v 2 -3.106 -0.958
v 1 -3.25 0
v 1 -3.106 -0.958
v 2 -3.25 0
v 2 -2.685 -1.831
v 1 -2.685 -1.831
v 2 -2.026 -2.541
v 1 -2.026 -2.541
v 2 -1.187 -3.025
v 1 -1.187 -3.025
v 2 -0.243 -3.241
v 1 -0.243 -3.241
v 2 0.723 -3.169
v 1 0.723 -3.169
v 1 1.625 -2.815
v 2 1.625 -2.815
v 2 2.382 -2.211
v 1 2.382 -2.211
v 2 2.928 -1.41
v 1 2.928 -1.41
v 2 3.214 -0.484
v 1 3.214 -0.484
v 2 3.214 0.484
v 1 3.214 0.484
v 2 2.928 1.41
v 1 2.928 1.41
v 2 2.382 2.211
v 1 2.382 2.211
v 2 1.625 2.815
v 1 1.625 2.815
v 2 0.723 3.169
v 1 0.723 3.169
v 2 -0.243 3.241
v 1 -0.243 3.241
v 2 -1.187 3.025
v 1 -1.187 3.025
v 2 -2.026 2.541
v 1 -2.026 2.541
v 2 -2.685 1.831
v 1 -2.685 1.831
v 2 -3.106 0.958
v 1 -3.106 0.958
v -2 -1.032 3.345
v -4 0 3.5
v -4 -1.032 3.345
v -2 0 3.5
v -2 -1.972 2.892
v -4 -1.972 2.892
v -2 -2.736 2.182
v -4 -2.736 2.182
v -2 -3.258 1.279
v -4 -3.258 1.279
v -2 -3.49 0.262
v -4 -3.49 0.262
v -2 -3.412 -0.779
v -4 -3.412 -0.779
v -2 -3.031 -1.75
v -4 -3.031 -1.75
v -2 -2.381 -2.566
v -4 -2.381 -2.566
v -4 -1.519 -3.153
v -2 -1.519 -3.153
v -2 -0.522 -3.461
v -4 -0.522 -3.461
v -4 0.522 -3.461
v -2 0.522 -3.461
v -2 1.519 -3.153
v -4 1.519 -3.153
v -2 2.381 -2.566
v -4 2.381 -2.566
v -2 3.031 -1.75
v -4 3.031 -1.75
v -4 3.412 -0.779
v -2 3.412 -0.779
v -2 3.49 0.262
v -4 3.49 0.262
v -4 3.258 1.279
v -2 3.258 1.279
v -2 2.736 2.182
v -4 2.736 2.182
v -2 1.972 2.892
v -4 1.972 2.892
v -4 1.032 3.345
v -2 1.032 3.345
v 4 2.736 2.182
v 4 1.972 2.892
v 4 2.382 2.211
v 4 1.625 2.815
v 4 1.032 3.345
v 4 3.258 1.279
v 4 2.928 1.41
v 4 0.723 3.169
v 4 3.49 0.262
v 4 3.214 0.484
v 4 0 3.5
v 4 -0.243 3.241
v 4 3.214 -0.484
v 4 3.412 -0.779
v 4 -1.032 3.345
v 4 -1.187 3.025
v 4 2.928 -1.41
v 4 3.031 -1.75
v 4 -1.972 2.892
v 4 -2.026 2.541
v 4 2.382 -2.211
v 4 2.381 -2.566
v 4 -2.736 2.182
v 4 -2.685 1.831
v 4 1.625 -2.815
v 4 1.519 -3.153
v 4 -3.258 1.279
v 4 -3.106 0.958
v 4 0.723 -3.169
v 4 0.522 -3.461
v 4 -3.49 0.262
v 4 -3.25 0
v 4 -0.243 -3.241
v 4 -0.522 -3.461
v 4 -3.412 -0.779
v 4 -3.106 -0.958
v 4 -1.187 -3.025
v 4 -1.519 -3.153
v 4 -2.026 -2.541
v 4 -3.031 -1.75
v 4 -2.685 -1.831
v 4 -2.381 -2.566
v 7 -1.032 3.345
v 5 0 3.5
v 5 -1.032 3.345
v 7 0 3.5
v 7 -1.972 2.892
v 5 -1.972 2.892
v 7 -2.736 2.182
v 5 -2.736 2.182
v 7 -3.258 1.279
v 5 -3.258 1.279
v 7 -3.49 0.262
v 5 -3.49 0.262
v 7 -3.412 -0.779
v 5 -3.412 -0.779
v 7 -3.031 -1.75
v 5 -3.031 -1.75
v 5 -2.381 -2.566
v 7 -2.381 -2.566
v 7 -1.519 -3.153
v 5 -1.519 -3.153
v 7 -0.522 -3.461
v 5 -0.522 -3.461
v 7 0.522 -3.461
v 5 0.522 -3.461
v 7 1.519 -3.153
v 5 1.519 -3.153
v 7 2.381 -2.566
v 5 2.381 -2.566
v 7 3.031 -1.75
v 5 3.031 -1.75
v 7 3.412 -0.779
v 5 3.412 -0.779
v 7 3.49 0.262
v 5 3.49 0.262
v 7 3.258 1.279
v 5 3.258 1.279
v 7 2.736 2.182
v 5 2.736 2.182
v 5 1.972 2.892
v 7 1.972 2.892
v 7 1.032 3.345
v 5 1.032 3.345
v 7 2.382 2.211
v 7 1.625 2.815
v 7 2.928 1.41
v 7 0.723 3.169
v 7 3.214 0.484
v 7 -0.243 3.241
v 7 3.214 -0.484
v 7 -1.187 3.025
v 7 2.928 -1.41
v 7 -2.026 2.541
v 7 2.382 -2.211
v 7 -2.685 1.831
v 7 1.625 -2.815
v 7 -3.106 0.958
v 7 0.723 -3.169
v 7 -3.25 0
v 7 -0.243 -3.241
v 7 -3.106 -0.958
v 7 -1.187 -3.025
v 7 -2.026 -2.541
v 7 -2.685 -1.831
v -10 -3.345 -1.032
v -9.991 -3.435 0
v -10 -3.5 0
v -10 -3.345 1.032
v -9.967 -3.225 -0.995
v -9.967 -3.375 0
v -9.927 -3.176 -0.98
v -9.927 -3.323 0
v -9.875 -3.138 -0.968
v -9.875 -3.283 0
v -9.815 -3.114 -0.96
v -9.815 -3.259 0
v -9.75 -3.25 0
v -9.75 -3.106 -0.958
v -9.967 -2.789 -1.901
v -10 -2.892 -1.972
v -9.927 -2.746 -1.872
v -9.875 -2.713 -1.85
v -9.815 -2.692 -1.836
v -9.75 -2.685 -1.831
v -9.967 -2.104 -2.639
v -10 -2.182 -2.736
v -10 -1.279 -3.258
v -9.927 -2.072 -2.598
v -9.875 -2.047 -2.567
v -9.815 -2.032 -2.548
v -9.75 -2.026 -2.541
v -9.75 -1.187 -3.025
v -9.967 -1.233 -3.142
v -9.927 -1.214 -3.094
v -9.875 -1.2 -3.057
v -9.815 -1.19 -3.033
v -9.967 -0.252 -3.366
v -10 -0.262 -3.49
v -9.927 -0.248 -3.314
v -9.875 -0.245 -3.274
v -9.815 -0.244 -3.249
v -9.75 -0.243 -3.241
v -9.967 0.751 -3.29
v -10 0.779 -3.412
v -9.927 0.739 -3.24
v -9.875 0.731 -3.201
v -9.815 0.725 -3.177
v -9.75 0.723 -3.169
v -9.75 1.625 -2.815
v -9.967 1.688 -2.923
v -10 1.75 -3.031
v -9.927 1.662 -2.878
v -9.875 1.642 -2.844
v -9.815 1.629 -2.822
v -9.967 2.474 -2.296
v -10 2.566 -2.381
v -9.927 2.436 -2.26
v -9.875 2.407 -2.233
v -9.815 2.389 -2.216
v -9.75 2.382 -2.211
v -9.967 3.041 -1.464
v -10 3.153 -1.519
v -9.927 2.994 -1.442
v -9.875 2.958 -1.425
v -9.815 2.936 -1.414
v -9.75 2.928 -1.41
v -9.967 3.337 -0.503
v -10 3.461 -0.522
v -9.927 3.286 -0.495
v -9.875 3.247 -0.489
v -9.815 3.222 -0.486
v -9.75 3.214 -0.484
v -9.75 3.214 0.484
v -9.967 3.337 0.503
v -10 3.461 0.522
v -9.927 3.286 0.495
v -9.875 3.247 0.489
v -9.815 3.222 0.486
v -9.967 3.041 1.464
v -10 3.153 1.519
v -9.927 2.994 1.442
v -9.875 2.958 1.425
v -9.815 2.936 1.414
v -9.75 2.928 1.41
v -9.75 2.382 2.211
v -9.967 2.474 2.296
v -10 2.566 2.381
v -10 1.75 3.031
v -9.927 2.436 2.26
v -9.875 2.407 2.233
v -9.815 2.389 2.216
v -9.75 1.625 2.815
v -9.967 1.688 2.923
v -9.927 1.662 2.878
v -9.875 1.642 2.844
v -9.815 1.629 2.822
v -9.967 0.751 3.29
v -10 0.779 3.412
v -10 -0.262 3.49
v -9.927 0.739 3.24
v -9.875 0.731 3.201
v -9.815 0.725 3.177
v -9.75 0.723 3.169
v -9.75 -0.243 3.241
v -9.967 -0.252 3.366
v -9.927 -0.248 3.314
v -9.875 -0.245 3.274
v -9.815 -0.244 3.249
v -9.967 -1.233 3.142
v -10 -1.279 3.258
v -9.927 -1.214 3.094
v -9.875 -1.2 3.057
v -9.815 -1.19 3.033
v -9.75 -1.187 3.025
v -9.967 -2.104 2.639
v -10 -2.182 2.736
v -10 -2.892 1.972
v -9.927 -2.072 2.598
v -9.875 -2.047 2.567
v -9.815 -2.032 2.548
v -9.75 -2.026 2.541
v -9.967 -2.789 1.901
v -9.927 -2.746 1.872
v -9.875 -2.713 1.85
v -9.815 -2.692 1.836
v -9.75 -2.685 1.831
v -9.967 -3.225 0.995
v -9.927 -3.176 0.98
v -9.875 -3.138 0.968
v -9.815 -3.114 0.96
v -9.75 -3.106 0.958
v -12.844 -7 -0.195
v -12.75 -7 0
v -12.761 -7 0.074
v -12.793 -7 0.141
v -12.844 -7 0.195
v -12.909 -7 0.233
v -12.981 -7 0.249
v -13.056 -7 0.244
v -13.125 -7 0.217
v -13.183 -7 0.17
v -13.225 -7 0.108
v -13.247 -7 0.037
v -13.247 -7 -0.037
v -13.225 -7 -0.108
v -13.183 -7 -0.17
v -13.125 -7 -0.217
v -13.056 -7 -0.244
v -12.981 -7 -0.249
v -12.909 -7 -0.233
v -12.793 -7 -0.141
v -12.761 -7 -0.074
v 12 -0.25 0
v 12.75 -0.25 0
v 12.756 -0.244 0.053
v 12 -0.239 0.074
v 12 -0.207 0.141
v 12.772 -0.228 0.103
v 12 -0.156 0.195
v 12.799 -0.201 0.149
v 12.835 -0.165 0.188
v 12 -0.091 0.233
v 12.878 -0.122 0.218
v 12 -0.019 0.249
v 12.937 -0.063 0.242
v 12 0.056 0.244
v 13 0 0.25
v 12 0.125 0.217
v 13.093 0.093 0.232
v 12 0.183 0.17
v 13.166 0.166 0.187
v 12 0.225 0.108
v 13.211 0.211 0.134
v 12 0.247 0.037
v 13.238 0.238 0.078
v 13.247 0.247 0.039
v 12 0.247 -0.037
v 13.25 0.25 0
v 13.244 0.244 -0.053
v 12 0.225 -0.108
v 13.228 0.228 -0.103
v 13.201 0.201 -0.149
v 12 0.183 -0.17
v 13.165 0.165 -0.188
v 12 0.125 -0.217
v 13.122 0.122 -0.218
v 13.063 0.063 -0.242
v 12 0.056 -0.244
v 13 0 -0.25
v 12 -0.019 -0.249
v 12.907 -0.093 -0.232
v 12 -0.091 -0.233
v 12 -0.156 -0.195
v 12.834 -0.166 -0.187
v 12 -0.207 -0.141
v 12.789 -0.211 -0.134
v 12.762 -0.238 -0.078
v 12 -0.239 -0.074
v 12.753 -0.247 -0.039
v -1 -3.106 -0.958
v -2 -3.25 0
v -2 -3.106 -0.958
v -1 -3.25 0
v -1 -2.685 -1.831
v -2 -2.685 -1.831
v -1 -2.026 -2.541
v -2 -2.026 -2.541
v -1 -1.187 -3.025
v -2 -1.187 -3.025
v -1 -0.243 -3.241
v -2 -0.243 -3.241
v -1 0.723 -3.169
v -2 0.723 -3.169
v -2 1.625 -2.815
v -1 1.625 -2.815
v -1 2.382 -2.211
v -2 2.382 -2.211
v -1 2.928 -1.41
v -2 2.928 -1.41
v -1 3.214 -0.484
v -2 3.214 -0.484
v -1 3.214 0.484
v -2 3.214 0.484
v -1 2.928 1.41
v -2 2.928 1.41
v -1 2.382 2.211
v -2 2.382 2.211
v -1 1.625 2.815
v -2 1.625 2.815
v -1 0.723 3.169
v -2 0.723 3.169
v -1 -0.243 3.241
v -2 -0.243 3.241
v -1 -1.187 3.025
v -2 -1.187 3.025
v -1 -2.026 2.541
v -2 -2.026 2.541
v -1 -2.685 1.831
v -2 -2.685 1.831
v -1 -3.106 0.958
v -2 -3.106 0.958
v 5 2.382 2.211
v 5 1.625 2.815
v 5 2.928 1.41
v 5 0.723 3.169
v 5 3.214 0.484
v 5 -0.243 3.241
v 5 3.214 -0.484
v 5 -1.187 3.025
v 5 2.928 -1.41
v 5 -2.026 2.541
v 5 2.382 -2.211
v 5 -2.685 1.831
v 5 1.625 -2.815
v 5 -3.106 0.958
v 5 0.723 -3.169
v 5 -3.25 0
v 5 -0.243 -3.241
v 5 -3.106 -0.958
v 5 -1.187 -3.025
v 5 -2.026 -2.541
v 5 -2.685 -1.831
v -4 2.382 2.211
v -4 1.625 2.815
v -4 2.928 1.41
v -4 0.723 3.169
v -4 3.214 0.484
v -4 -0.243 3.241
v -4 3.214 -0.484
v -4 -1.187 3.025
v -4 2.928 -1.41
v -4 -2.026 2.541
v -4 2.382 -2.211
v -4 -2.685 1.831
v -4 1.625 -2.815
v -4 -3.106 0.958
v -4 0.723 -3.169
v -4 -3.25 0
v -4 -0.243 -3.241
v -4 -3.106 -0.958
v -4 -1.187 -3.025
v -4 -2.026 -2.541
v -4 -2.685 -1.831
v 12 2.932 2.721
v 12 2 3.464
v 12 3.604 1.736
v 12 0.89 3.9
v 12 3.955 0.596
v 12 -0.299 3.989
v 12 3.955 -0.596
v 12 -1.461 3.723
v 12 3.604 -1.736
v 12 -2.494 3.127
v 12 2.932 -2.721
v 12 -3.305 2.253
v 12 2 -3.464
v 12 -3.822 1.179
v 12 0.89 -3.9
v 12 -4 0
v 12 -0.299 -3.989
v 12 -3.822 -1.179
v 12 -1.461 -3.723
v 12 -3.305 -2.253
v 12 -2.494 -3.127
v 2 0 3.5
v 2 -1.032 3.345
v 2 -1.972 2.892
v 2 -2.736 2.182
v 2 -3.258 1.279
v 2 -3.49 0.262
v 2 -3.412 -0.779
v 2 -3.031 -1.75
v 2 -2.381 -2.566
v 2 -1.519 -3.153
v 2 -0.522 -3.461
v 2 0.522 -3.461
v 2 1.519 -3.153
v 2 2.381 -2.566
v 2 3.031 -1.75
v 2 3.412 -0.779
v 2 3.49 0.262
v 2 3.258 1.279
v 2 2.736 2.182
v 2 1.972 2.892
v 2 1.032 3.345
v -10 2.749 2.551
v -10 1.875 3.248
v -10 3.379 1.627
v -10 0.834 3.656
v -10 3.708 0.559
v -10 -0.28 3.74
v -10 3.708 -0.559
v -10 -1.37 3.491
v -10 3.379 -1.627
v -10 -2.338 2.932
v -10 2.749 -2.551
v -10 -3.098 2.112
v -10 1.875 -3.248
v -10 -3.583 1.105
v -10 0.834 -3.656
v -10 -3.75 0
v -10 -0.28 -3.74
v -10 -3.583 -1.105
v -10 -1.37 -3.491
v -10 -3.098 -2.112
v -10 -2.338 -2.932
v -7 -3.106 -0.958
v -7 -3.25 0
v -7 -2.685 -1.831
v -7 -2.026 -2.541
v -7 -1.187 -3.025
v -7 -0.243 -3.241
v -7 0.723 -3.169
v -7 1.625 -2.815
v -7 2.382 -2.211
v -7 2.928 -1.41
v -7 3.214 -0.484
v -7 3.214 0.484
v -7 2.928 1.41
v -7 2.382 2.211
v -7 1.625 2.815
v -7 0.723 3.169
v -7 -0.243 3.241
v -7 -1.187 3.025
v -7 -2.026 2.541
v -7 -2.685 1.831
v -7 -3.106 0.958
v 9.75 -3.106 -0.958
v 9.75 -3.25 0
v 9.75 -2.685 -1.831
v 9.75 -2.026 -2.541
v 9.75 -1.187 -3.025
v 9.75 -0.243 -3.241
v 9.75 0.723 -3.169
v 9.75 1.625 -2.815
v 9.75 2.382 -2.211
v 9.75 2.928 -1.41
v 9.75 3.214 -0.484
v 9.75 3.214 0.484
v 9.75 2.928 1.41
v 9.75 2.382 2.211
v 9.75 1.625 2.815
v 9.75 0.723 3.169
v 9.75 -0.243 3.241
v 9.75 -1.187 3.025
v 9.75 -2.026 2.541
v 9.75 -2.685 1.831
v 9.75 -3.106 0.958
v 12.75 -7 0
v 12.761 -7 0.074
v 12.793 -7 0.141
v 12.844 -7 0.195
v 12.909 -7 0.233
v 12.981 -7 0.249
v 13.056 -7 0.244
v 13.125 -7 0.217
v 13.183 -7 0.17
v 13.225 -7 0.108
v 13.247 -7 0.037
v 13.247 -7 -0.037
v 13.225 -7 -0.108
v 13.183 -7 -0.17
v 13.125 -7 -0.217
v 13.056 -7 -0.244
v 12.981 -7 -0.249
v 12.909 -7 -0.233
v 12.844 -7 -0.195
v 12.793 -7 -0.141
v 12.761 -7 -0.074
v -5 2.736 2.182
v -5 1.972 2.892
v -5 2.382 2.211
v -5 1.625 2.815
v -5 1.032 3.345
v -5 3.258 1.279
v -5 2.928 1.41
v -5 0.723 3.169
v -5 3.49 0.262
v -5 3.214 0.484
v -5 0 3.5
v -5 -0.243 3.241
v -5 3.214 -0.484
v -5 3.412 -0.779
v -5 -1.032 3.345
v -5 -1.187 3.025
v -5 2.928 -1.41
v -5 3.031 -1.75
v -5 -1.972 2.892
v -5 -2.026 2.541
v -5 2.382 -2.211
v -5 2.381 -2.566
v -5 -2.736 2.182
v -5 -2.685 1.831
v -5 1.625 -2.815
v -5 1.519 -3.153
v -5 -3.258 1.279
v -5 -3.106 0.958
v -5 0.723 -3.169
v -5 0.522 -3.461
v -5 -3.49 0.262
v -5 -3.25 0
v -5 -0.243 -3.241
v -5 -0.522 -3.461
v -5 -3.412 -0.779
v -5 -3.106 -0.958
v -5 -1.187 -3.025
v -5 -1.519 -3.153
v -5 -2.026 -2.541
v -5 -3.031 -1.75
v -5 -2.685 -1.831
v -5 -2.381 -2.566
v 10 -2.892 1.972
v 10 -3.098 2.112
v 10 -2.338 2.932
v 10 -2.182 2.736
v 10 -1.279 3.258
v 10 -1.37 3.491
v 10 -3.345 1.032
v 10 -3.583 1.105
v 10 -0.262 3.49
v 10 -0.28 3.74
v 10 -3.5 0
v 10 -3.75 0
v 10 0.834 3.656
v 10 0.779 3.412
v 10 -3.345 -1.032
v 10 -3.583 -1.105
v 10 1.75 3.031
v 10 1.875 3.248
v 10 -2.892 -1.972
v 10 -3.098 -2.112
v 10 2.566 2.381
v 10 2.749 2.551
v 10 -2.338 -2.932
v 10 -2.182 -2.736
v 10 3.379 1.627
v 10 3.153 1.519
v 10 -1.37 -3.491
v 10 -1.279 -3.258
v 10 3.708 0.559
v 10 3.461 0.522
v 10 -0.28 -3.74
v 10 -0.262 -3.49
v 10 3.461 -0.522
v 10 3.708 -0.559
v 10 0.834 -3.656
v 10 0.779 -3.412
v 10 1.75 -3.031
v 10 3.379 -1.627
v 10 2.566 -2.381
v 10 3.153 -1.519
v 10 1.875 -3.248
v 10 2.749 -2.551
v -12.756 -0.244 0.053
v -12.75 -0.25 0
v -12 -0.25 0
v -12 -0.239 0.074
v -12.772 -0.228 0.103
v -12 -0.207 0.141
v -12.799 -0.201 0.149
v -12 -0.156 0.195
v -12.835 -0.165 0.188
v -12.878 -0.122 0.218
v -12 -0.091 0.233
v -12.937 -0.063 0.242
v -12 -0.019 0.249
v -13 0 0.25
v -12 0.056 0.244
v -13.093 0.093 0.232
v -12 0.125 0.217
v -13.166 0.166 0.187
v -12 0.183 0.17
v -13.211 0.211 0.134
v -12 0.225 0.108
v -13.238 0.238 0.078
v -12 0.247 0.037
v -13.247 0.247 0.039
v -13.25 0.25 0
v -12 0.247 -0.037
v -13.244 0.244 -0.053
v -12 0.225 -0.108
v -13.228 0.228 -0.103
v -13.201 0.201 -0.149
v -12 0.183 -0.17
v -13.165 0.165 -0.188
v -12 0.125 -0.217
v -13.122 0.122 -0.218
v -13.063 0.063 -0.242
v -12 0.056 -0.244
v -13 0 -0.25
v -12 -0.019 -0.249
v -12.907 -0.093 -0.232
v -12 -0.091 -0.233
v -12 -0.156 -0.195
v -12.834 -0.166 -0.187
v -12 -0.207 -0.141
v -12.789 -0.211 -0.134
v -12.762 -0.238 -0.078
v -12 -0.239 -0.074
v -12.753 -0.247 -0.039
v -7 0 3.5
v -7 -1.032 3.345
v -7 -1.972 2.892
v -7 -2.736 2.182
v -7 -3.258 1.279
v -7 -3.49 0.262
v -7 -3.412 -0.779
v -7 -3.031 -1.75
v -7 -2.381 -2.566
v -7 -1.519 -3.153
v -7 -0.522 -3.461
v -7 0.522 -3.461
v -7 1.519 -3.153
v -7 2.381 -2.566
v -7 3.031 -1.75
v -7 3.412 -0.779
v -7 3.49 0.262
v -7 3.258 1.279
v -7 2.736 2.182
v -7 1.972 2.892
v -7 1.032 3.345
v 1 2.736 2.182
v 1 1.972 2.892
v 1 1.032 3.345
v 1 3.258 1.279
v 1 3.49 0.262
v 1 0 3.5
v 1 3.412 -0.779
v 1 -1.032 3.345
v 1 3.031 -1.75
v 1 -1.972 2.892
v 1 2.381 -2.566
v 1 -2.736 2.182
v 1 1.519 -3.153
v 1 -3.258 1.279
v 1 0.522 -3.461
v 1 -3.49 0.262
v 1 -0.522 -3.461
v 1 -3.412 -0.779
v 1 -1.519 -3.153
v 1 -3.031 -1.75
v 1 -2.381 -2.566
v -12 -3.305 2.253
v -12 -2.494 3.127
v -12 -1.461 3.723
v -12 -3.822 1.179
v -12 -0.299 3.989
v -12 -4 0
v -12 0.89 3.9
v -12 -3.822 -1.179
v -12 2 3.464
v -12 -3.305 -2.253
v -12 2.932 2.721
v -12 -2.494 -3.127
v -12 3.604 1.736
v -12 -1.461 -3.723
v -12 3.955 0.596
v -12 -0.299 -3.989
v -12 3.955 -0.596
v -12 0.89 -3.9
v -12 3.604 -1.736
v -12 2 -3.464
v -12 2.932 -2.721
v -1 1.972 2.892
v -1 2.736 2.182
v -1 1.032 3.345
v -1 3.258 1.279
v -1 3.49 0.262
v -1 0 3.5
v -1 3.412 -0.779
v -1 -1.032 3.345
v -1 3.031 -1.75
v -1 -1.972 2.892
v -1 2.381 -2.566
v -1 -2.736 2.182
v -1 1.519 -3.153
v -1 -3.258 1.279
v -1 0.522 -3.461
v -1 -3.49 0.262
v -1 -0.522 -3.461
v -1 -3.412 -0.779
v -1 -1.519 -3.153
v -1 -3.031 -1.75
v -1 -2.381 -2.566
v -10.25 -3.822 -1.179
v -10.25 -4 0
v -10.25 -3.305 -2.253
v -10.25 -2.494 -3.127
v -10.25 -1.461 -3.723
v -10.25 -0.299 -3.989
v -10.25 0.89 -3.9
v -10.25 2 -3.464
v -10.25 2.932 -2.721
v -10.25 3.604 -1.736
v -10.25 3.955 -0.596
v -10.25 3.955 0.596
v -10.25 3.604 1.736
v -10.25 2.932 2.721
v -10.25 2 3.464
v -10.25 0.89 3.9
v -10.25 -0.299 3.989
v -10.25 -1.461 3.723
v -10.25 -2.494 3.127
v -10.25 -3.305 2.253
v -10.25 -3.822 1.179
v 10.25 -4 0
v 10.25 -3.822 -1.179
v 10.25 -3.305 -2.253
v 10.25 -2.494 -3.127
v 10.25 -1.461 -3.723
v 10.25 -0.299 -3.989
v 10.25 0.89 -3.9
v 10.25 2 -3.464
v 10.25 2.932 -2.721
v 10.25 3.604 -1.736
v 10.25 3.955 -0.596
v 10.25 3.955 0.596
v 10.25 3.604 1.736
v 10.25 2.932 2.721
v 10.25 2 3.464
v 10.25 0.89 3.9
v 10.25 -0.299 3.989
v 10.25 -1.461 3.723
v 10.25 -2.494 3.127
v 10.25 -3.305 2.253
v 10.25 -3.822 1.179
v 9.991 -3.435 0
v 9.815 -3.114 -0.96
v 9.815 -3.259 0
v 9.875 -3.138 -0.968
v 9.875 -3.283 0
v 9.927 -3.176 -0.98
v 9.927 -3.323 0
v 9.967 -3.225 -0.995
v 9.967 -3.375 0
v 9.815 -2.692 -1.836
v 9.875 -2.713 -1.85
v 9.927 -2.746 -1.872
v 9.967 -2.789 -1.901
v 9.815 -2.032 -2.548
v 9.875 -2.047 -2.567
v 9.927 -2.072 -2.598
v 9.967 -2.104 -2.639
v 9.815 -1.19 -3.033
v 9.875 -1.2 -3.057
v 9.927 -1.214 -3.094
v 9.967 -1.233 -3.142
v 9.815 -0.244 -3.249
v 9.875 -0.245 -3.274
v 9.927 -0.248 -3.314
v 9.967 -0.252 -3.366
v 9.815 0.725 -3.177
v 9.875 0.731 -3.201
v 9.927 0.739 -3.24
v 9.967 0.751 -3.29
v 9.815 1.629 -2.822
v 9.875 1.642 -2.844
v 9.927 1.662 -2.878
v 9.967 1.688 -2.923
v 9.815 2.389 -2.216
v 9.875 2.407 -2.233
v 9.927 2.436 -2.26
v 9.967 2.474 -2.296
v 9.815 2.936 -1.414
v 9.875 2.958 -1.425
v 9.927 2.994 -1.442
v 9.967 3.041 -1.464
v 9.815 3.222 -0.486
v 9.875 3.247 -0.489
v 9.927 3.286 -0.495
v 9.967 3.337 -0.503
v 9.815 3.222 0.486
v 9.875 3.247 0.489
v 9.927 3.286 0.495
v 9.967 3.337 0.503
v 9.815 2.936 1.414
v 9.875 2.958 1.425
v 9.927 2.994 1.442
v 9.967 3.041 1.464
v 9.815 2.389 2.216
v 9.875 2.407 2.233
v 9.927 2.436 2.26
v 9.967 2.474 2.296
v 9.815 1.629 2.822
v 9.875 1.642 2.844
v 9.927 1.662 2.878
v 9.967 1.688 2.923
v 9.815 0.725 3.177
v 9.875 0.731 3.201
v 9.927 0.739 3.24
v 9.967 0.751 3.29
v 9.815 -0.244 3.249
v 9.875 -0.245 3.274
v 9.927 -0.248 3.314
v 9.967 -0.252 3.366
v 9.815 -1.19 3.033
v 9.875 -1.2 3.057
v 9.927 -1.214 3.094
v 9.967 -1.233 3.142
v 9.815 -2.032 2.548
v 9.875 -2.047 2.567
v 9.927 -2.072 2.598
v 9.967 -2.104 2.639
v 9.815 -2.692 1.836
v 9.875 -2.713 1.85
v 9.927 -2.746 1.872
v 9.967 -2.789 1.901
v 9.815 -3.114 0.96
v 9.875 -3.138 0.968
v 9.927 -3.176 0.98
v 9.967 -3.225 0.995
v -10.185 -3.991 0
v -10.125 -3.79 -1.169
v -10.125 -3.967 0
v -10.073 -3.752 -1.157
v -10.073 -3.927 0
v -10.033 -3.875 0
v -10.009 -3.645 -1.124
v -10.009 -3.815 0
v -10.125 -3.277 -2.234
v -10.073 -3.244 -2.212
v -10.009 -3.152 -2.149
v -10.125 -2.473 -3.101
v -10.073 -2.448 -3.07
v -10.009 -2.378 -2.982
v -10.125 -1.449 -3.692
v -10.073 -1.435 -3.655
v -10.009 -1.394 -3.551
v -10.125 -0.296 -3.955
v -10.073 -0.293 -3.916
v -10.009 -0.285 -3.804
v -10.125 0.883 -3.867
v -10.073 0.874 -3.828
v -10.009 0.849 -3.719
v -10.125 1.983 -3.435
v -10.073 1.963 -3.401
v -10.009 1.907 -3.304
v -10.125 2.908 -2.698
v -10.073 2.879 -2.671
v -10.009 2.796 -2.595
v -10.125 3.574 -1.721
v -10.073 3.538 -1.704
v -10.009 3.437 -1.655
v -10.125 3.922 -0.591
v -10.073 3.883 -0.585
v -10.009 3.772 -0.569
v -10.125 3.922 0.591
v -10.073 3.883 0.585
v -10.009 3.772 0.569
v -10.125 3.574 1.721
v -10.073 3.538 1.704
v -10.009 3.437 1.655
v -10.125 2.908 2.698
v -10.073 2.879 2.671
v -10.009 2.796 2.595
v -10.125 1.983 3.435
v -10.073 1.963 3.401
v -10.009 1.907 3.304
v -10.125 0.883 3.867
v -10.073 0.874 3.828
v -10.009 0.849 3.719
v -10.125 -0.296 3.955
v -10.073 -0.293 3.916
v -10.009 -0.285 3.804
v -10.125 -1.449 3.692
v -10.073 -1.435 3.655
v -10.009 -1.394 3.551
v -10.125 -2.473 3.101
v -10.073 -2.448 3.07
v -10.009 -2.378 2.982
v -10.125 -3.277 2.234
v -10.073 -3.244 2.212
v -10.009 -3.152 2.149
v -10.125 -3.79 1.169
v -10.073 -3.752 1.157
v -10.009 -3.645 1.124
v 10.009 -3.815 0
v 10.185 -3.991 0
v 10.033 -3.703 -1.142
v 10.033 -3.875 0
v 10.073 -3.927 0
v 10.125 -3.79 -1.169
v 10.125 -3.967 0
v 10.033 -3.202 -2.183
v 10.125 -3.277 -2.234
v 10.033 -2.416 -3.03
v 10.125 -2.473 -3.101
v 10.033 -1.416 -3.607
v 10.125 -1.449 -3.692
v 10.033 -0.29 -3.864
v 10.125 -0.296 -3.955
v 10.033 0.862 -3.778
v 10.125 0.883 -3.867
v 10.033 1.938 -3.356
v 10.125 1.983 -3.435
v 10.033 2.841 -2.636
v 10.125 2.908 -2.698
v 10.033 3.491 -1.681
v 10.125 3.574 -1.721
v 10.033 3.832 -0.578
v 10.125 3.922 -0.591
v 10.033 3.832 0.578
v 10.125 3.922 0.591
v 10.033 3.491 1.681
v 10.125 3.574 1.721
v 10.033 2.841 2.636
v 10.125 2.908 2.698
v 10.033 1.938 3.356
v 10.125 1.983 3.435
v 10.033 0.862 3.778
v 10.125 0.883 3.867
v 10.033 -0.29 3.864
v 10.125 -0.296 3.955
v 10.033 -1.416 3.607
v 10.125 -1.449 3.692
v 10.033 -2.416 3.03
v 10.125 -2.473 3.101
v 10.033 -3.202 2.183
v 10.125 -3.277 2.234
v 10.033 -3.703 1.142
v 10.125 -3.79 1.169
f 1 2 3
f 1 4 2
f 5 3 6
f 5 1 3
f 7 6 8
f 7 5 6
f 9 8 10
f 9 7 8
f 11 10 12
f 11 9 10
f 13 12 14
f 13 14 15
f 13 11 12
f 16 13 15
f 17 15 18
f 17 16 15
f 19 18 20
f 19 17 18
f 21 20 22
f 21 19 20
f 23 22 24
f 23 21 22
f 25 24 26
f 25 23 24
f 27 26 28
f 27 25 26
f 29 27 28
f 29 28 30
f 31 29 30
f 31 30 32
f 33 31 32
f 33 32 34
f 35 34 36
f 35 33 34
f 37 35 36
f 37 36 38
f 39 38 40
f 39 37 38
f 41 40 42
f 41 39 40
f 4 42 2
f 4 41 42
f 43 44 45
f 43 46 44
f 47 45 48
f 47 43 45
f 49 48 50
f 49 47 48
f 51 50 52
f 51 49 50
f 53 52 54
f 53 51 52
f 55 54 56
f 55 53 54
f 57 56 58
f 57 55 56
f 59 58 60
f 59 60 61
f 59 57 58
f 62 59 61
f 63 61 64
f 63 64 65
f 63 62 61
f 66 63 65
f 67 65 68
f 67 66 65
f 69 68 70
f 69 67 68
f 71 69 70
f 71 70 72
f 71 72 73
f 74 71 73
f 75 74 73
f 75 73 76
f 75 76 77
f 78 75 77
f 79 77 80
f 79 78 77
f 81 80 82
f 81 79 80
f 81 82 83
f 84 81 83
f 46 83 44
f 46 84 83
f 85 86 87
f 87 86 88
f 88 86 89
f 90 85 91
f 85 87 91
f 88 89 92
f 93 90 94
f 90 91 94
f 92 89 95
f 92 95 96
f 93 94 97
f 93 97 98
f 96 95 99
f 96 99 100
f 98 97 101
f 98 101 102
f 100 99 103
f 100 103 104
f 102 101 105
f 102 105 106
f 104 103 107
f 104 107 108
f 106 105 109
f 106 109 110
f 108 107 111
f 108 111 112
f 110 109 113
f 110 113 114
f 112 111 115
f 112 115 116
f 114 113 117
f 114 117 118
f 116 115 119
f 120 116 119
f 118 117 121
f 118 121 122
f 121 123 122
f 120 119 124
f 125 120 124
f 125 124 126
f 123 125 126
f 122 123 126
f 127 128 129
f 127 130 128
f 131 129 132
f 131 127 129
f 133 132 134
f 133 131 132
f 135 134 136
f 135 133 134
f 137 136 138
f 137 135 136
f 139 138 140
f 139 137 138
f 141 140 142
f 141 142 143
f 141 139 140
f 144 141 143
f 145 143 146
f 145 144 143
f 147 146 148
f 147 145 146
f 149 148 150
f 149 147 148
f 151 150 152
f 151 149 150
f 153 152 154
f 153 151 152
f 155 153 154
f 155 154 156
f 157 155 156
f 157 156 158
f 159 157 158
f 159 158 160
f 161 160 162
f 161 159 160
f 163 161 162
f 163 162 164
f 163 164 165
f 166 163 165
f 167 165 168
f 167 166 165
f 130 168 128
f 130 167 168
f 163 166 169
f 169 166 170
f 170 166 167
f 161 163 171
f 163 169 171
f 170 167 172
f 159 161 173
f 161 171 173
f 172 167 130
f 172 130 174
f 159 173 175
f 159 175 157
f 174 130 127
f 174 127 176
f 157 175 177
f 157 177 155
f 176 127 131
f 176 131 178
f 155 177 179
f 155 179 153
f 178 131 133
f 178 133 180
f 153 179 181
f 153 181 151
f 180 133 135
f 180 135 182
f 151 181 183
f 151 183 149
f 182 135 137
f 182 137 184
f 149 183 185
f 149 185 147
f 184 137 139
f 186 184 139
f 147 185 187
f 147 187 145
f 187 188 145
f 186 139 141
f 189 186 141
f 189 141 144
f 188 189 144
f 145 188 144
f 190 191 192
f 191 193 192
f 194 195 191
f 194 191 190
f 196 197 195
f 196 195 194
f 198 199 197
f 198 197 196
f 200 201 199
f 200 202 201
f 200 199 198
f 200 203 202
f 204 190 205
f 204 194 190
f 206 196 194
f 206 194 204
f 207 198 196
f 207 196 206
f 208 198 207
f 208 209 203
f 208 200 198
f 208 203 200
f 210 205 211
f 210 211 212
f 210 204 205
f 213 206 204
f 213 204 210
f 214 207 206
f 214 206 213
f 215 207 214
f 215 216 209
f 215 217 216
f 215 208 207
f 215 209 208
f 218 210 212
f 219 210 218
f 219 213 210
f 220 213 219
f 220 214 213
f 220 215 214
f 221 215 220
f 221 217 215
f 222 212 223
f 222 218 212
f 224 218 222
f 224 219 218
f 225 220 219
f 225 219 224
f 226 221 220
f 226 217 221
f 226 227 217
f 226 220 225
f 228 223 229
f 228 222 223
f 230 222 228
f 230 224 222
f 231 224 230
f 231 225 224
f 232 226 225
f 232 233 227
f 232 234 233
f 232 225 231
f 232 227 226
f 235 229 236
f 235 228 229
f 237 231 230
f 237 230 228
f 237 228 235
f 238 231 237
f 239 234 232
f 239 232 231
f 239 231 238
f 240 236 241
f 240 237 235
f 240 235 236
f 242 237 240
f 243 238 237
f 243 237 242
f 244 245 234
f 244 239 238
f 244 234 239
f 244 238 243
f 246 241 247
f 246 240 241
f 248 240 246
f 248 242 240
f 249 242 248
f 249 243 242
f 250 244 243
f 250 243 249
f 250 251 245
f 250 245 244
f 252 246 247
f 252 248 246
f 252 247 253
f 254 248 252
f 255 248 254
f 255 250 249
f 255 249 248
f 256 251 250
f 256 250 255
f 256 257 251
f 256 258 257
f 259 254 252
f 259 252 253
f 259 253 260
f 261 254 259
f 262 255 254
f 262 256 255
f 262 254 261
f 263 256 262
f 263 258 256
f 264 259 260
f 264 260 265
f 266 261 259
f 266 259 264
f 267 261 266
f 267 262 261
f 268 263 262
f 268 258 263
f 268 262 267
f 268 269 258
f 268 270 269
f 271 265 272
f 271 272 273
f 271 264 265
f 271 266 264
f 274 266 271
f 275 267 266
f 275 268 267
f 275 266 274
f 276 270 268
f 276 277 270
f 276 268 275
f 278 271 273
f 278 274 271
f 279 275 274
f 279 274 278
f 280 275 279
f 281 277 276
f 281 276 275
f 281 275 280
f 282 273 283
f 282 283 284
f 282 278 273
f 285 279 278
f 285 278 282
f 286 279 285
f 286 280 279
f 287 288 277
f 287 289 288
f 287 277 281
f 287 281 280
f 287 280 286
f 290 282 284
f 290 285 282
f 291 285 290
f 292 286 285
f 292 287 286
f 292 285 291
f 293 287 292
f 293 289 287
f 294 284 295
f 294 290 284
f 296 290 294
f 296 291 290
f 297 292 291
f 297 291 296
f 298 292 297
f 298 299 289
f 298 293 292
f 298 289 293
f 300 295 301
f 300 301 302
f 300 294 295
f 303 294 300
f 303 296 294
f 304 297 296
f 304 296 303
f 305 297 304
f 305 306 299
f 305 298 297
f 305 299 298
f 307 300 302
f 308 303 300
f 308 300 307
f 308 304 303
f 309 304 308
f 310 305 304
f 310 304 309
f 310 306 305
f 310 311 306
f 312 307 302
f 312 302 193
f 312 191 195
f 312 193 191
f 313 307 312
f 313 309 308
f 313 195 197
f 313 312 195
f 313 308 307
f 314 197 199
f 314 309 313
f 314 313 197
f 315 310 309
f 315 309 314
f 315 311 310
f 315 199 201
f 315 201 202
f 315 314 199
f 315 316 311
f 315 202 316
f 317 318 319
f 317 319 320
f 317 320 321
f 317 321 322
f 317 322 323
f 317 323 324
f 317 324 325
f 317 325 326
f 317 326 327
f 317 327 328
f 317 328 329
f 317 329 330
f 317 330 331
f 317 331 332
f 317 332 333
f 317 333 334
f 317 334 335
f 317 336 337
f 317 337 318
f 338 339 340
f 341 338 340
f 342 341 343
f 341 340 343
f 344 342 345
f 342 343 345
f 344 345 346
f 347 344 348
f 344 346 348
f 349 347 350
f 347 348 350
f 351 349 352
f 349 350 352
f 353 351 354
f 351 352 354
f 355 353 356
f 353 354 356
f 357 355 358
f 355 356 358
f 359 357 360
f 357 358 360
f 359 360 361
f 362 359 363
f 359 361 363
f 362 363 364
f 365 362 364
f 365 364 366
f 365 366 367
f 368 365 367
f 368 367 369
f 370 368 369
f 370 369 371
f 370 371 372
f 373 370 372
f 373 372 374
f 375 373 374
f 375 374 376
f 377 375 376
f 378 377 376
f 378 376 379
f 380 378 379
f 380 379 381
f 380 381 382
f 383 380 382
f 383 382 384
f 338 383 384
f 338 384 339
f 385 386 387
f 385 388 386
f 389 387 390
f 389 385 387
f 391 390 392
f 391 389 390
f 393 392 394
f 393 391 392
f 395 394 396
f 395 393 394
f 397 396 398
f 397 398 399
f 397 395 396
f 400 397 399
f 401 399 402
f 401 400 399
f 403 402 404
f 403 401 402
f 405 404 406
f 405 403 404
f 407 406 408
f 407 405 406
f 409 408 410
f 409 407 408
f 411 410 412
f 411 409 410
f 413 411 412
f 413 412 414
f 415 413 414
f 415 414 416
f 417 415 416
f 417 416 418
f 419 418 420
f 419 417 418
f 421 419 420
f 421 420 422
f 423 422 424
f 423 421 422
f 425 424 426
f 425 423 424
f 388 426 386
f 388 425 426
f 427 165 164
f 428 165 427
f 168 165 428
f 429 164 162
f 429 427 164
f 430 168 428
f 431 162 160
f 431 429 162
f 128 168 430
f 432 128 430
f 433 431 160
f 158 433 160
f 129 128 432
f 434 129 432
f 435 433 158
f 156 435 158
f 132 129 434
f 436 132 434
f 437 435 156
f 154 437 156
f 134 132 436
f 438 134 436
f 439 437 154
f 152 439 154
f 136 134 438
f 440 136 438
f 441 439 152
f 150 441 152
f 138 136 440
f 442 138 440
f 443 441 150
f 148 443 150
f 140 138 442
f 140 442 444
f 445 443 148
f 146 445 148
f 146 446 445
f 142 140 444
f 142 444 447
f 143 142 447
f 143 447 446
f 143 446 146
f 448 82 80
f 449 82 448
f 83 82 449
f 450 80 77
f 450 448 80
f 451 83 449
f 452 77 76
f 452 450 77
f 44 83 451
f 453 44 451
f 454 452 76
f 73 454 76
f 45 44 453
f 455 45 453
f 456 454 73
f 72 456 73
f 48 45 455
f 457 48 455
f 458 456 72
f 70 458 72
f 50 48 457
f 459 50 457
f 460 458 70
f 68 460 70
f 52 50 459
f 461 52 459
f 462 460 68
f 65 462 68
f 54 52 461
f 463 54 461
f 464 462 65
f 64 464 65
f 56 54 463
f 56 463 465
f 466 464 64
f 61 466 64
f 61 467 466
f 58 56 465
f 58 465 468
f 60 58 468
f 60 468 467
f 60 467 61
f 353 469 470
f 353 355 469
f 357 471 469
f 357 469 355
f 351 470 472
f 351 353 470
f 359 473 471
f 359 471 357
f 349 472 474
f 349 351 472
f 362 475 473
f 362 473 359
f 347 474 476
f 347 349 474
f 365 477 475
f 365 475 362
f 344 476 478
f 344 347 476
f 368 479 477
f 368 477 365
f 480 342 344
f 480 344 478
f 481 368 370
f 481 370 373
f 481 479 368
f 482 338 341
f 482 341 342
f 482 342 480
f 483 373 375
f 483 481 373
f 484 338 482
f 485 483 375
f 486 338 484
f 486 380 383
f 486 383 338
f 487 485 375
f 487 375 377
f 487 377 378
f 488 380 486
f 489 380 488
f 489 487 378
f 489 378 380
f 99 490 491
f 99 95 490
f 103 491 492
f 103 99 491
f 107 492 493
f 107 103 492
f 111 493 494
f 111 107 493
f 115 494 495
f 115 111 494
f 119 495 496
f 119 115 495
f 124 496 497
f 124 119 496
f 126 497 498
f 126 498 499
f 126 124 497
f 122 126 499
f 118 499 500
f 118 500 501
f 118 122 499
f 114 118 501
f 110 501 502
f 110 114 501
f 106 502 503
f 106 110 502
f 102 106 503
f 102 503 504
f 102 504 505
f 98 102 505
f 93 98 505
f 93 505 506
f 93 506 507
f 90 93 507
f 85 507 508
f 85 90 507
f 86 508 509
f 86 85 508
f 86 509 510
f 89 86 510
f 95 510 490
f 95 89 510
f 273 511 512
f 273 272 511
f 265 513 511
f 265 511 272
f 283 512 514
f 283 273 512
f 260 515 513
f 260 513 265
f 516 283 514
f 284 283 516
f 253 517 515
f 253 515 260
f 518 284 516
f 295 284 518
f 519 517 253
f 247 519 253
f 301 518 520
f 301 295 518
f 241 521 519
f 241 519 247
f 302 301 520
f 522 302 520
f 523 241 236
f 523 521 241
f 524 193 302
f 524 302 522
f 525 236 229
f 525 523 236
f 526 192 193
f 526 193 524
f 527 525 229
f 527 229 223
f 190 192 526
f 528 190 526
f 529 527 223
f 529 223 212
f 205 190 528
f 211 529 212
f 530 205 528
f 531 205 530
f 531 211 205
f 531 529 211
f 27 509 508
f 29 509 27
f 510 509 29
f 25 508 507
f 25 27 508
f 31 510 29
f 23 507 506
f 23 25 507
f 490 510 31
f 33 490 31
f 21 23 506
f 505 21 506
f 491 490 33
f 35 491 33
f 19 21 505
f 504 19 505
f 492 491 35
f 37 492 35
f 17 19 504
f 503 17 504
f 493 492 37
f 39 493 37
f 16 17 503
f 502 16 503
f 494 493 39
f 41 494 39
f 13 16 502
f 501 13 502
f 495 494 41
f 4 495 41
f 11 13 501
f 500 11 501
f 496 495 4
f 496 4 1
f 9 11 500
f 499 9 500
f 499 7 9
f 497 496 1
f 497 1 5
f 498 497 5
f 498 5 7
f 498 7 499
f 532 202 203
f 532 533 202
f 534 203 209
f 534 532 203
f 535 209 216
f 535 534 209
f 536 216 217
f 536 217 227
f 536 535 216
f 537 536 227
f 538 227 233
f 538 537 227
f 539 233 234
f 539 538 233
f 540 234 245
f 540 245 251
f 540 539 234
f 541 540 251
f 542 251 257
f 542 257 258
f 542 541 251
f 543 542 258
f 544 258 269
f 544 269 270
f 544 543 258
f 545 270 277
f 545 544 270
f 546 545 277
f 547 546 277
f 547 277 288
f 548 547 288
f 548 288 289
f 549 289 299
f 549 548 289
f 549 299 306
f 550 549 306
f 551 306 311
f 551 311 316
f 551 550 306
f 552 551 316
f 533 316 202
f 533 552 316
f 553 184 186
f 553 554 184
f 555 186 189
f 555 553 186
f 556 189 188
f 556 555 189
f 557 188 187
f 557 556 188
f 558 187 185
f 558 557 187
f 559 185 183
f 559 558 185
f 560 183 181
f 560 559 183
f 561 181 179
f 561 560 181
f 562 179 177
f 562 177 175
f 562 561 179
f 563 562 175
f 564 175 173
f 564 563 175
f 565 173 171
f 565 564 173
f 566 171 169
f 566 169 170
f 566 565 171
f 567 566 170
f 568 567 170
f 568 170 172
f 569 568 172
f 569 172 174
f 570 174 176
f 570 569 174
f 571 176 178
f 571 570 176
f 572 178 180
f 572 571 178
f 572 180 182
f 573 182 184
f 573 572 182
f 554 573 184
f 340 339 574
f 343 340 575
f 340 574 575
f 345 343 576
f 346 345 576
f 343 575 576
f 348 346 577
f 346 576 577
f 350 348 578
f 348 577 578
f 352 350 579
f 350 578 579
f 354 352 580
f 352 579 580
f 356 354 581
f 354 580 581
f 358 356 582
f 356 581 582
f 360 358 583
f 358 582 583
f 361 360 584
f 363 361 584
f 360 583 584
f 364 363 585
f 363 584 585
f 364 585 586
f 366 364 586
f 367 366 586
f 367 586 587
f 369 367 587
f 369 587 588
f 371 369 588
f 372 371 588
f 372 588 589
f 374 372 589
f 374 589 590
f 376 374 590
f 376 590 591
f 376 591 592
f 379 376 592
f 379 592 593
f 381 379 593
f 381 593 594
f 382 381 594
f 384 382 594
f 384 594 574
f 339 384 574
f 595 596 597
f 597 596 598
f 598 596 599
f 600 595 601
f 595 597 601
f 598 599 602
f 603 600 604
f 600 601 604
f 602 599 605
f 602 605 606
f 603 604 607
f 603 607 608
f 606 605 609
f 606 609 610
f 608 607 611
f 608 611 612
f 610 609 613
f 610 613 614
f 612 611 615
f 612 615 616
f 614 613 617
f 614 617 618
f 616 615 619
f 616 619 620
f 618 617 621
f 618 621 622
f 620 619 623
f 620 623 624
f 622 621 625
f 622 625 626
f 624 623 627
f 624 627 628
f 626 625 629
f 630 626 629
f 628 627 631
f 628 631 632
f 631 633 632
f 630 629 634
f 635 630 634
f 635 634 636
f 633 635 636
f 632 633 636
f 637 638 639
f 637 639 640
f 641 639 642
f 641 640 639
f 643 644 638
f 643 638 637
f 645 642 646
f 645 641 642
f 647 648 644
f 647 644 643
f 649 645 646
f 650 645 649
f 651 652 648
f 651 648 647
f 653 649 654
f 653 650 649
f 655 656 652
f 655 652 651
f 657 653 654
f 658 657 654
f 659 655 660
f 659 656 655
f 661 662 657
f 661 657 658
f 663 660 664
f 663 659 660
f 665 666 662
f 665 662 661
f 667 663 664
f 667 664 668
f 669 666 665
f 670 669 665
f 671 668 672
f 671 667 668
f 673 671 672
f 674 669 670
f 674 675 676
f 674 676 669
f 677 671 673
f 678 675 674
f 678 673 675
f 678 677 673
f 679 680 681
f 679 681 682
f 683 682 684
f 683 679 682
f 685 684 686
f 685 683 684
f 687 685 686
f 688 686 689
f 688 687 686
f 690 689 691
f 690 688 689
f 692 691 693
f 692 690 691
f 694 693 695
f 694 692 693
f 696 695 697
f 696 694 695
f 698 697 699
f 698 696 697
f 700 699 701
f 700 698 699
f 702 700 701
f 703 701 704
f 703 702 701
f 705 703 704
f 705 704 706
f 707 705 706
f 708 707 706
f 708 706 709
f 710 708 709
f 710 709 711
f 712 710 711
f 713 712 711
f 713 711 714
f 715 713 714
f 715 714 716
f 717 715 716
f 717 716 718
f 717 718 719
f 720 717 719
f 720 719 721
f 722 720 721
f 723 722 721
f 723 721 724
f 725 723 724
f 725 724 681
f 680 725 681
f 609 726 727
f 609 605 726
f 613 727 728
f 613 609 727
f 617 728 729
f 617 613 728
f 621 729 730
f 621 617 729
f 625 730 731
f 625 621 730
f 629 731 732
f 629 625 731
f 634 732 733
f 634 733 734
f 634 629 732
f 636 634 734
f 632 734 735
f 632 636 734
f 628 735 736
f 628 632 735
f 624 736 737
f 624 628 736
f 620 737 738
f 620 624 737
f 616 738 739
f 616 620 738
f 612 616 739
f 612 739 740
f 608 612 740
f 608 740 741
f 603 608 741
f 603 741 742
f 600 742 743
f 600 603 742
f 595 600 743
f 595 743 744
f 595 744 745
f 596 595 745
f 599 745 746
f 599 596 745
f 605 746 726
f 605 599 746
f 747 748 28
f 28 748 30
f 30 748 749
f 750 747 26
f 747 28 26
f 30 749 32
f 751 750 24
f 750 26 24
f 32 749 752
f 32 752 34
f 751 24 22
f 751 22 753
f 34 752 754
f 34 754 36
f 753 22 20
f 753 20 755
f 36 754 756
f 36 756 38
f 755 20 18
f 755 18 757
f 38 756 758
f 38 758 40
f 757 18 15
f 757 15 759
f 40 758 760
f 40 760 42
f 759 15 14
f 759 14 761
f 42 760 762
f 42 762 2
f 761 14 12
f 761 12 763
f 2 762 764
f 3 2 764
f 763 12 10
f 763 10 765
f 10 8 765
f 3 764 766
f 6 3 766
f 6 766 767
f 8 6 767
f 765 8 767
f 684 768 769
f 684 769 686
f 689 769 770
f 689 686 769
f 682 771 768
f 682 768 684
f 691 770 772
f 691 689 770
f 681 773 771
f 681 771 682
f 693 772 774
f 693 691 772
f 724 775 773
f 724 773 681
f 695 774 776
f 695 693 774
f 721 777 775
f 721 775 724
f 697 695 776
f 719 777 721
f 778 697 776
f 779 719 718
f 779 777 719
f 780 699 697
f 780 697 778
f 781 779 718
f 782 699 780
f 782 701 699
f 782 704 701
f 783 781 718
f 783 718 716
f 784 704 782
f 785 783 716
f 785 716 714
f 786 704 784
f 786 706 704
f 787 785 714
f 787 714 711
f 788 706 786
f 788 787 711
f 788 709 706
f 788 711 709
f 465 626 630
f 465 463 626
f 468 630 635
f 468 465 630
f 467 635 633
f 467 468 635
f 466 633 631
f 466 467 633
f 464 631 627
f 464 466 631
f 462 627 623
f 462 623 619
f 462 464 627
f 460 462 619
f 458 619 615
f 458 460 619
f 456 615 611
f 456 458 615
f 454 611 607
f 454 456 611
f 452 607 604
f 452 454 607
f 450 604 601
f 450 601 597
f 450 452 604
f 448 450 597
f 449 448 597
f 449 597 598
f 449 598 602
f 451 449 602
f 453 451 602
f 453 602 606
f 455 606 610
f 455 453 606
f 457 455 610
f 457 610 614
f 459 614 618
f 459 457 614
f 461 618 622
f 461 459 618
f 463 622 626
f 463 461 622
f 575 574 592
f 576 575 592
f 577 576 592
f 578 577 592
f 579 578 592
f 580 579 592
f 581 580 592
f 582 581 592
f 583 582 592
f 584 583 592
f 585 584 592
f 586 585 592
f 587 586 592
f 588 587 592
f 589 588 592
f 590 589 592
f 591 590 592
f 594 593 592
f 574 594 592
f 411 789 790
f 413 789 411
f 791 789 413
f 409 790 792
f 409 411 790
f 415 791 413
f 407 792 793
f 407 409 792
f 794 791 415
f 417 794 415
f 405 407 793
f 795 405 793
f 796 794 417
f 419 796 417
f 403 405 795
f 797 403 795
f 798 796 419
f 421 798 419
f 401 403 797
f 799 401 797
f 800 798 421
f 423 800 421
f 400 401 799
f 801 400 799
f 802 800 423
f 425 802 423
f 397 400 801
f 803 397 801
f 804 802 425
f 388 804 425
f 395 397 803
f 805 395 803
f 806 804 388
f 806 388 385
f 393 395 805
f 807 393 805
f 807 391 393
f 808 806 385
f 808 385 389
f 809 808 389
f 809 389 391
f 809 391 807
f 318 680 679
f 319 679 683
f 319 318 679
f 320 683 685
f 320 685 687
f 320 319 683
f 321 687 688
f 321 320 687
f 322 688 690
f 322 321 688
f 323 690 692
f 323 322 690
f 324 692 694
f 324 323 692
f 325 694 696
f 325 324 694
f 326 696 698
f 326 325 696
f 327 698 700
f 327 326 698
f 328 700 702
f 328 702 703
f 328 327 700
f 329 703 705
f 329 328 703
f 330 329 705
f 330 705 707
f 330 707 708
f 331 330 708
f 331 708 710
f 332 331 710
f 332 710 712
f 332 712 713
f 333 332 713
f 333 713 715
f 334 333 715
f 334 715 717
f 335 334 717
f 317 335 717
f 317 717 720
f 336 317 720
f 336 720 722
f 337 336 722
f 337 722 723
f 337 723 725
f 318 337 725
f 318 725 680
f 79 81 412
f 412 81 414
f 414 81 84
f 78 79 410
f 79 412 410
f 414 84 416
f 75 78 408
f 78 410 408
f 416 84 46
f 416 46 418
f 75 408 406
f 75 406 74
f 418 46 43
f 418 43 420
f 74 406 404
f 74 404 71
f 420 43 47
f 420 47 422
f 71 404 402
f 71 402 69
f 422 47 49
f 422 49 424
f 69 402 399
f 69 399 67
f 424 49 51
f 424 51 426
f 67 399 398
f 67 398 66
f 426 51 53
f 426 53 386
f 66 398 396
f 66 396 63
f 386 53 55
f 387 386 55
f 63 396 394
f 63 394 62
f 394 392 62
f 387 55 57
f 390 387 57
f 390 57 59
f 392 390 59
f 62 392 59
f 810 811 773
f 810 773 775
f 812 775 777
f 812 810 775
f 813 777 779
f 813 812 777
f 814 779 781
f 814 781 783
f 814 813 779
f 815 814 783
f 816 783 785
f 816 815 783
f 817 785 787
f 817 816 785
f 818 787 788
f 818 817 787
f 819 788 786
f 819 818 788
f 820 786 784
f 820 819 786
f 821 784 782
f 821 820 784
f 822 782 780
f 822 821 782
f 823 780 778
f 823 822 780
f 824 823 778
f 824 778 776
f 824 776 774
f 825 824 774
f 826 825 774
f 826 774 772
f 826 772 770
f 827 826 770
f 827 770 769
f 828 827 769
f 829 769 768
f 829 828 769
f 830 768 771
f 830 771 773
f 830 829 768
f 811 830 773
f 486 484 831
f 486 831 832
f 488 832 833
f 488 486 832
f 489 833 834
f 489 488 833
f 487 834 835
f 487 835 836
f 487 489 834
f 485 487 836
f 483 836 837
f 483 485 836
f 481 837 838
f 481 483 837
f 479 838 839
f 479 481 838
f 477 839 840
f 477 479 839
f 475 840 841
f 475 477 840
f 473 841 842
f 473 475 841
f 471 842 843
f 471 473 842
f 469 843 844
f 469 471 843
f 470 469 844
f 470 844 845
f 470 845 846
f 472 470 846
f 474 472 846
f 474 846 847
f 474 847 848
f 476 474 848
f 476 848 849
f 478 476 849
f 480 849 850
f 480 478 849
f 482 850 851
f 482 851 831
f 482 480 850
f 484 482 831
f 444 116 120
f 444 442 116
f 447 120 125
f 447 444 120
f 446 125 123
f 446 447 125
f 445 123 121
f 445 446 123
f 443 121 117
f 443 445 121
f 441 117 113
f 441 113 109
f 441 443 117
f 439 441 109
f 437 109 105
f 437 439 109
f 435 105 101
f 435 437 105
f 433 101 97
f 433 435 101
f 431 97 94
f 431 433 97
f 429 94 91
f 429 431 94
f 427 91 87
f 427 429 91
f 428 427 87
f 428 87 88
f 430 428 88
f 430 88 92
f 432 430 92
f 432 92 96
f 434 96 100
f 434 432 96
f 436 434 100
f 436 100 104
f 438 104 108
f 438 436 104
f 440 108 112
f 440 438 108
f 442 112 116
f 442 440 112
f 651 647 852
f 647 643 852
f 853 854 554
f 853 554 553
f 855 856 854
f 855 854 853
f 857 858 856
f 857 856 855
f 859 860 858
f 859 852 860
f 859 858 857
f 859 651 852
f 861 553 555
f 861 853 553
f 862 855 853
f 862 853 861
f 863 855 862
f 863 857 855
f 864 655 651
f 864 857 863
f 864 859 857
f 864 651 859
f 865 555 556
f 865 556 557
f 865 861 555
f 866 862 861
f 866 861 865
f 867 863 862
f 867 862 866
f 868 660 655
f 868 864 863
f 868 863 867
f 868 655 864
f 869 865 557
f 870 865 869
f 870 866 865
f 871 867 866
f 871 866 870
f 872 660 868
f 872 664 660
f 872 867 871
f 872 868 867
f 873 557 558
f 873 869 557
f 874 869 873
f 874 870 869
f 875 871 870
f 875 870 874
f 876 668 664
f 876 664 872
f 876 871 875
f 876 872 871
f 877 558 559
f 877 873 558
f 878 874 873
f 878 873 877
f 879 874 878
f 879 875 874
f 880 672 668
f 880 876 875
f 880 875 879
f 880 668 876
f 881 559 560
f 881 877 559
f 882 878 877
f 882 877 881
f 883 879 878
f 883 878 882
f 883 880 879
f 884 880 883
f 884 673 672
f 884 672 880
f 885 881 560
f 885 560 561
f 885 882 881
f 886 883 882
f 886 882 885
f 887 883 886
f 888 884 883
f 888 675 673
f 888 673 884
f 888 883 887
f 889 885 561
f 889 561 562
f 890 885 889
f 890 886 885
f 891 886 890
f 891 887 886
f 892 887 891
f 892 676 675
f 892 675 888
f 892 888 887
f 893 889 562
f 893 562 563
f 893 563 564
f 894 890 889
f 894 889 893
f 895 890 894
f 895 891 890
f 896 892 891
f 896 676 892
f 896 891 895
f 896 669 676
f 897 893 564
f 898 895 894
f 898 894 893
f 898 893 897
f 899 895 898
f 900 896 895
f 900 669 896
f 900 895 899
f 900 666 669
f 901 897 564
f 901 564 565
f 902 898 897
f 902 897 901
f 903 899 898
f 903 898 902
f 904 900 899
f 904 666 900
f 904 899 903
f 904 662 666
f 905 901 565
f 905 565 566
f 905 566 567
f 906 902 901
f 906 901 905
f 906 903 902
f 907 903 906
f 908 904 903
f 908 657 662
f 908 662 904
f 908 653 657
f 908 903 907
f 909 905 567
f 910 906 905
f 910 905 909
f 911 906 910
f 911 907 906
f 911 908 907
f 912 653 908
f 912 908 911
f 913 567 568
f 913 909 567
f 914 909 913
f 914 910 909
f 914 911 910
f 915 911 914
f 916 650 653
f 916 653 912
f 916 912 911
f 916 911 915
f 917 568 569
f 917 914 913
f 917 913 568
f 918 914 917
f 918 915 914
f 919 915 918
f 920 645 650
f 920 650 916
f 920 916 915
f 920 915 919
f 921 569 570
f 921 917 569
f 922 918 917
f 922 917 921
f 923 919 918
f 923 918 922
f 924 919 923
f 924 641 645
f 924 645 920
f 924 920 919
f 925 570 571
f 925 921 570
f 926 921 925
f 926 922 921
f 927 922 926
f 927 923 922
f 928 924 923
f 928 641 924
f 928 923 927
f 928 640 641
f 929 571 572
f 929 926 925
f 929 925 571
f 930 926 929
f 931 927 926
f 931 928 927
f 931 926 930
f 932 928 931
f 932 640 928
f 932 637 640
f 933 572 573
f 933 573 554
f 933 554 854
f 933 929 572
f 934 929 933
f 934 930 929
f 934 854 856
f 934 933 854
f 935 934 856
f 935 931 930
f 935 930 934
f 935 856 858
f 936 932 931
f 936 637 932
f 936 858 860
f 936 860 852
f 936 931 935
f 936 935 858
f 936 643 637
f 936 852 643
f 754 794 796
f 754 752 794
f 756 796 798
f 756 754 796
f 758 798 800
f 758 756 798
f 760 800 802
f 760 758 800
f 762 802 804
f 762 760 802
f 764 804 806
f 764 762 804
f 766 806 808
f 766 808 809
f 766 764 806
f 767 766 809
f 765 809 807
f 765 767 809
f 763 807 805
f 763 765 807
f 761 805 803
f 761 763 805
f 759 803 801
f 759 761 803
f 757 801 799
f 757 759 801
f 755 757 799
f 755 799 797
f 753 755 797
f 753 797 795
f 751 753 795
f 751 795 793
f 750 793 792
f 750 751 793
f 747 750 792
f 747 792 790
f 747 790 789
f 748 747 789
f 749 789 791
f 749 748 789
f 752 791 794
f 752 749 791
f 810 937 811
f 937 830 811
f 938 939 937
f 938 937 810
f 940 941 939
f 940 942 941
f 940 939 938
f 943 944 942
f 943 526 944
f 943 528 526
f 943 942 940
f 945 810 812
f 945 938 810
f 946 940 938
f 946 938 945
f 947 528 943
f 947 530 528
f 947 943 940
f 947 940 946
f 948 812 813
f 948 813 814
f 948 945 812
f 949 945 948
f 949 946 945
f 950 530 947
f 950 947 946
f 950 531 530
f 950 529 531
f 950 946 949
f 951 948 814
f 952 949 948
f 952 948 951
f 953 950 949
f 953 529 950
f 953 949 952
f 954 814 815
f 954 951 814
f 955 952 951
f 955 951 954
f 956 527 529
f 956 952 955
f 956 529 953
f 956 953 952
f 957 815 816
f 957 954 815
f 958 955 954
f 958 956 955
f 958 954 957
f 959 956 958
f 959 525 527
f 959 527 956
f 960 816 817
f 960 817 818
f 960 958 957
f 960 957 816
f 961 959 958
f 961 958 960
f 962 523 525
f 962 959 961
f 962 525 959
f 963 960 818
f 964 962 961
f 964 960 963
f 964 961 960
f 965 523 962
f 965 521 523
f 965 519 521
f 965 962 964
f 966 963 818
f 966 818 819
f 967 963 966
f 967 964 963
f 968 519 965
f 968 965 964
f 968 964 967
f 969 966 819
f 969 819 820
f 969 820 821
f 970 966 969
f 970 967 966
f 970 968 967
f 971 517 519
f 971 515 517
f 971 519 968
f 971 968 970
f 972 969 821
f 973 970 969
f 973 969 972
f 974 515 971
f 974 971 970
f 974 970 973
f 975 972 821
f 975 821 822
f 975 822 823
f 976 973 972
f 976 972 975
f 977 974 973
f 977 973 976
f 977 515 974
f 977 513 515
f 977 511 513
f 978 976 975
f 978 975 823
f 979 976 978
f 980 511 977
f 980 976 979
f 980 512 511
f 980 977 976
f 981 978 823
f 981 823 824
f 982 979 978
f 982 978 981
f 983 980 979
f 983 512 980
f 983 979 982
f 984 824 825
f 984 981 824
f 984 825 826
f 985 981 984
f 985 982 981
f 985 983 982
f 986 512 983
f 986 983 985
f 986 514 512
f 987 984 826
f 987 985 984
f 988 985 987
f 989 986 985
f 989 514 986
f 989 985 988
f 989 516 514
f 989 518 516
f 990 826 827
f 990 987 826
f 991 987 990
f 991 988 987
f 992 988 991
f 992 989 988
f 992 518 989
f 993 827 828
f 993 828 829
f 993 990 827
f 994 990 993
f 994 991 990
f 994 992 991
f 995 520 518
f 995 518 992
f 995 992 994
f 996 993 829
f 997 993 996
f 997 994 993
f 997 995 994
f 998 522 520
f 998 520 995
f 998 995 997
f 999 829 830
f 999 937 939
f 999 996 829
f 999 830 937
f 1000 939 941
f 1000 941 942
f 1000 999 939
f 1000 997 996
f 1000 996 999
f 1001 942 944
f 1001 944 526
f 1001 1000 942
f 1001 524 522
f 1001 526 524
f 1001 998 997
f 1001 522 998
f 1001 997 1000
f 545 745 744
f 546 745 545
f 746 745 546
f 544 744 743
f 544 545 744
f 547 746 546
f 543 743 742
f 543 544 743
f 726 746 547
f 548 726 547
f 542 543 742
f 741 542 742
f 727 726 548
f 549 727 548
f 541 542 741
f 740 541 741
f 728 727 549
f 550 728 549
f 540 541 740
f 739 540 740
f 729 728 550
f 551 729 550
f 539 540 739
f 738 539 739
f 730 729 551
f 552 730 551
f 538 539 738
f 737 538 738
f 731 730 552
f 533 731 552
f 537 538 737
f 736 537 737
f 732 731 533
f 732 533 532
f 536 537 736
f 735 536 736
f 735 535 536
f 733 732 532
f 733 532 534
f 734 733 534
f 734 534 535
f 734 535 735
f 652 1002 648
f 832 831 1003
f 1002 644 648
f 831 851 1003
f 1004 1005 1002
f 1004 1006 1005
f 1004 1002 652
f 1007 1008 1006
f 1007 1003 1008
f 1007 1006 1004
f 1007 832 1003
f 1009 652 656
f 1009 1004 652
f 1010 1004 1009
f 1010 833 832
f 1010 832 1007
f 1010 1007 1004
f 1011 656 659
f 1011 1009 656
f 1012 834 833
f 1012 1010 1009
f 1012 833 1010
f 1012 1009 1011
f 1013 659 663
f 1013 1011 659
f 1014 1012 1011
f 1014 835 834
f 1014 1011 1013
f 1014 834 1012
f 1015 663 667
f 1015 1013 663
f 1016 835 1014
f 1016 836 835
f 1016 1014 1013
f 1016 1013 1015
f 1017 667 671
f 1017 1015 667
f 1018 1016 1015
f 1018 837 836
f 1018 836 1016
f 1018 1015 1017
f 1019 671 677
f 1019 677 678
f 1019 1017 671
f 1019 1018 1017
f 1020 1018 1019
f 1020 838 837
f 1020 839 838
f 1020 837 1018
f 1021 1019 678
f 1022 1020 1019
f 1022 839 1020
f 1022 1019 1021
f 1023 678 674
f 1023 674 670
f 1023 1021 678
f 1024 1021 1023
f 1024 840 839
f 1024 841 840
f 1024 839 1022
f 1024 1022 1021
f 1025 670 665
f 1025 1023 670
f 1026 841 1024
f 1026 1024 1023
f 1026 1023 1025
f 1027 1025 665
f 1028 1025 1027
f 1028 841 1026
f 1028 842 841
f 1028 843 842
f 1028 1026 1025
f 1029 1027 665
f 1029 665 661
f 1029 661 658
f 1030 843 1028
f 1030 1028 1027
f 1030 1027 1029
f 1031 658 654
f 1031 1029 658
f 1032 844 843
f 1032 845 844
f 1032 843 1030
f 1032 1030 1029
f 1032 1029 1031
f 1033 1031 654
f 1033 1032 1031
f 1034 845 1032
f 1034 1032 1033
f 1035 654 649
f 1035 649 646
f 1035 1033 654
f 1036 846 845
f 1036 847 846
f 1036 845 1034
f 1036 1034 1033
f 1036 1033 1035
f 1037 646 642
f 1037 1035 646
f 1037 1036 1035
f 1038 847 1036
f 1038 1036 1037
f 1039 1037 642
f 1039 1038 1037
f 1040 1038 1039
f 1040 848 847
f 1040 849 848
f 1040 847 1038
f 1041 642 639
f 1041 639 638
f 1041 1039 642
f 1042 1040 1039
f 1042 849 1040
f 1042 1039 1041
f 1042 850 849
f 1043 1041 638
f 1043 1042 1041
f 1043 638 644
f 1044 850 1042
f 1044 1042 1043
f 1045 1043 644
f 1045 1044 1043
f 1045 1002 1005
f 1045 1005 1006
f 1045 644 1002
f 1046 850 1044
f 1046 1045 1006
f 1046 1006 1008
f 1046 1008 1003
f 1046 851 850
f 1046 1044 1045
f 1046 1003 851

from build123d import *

# Parameters (mm, degrees)
FILLET_1_R        = 0.25
SKETCH_2_W        = 2
SKETCH_2_H        = 0.5
SWEEP_1_PROFILE_R = 0.25


with BuildPart() as part:
    # 草图1 → 旋转2 (revolve)
    with BuildSketch(Plane.XY, mode=Mode.PRIVATE) as revolve_2_sk:
        Polygon((-12, 0), (-12, 4), (-10, 4), (-10, 3.25), (10, 3.25), (10, 4), (12, 4), (12, 0), align=None)
    revolve(revolve_2_sk.sketch.rotate(Axis((-12, 0, 0), (1, 0, 0)), 180), axis=Axis((-12, 0, 0), (1, 0, 0)))

    # 圆角1
    fillet_1_edges = [part.edges().sort_by_distance(p)[0] for p in [
        (-10, 4, 0),
        (-10, 3.25, 0),
        (10, 3.25, 0),
        (10, 4, 0),
    ]]
    fillet(fillet_1_edges, radius=FILLET_1_R)

    # 草图2 → 旋转3 (revolve)
    with BuildSketch(Plane.XY, mode=Mode.PRIVATE) as revolve_3_sk:
        with Locations((3, 3.25)):
            Rectangle(SKETCH_2_W, SKETCH_2_H)
        with Locations((0, 3.25)):
            Rectangle(SKETCH_2_W, SKETCH_2_H)
        with Locations((6, 3.25)):
            Rectangle(SKETCH_2_W, SKETCH_2_H)
        with Locations((-3, 3.25)):
            Rectangle(SKETCH_2_W, SKETCH_2_H)
        with Locations((-6, 3.25)):
            Rectangle(SKETCH_2_W, SKETCH_2_H)
    revolve(revolve_3_sk.sketch.rotate(Axis((-1000, 0, 0), (1, 0, 0)), 90), axis=Axis((-1000, 0, 0), (1, 0, 0)))

    # 扫描1: sweep along a path in 草图3
    with BuildLine(Plane.XY) as sweep_1_path:
        Line((-12, 0), (-13, 0))
        Line((-13, 0), (-13, -7))
    # 扫描1 profile (on start of the path) → 扫描1 (sweep)
    with BuildSketch(Plane(origin=(-12, 0, 0), x_dir=(0, -1, 0), z_dir=(-1, 0, 0))):
        Circle(SWEEP_1_PROFILE_R)
    sweep_1 = sweep(path=sweep_1_path.line, transition=Transition.RIGHT)

    # 镜向1: 扫描1 across plane
    add(sweep_1.mirror(Plane(origin=(0, 0, 0), x_dir=(0, 0, 1), z_dir=(1, 0, 0))))


solid = part.part
